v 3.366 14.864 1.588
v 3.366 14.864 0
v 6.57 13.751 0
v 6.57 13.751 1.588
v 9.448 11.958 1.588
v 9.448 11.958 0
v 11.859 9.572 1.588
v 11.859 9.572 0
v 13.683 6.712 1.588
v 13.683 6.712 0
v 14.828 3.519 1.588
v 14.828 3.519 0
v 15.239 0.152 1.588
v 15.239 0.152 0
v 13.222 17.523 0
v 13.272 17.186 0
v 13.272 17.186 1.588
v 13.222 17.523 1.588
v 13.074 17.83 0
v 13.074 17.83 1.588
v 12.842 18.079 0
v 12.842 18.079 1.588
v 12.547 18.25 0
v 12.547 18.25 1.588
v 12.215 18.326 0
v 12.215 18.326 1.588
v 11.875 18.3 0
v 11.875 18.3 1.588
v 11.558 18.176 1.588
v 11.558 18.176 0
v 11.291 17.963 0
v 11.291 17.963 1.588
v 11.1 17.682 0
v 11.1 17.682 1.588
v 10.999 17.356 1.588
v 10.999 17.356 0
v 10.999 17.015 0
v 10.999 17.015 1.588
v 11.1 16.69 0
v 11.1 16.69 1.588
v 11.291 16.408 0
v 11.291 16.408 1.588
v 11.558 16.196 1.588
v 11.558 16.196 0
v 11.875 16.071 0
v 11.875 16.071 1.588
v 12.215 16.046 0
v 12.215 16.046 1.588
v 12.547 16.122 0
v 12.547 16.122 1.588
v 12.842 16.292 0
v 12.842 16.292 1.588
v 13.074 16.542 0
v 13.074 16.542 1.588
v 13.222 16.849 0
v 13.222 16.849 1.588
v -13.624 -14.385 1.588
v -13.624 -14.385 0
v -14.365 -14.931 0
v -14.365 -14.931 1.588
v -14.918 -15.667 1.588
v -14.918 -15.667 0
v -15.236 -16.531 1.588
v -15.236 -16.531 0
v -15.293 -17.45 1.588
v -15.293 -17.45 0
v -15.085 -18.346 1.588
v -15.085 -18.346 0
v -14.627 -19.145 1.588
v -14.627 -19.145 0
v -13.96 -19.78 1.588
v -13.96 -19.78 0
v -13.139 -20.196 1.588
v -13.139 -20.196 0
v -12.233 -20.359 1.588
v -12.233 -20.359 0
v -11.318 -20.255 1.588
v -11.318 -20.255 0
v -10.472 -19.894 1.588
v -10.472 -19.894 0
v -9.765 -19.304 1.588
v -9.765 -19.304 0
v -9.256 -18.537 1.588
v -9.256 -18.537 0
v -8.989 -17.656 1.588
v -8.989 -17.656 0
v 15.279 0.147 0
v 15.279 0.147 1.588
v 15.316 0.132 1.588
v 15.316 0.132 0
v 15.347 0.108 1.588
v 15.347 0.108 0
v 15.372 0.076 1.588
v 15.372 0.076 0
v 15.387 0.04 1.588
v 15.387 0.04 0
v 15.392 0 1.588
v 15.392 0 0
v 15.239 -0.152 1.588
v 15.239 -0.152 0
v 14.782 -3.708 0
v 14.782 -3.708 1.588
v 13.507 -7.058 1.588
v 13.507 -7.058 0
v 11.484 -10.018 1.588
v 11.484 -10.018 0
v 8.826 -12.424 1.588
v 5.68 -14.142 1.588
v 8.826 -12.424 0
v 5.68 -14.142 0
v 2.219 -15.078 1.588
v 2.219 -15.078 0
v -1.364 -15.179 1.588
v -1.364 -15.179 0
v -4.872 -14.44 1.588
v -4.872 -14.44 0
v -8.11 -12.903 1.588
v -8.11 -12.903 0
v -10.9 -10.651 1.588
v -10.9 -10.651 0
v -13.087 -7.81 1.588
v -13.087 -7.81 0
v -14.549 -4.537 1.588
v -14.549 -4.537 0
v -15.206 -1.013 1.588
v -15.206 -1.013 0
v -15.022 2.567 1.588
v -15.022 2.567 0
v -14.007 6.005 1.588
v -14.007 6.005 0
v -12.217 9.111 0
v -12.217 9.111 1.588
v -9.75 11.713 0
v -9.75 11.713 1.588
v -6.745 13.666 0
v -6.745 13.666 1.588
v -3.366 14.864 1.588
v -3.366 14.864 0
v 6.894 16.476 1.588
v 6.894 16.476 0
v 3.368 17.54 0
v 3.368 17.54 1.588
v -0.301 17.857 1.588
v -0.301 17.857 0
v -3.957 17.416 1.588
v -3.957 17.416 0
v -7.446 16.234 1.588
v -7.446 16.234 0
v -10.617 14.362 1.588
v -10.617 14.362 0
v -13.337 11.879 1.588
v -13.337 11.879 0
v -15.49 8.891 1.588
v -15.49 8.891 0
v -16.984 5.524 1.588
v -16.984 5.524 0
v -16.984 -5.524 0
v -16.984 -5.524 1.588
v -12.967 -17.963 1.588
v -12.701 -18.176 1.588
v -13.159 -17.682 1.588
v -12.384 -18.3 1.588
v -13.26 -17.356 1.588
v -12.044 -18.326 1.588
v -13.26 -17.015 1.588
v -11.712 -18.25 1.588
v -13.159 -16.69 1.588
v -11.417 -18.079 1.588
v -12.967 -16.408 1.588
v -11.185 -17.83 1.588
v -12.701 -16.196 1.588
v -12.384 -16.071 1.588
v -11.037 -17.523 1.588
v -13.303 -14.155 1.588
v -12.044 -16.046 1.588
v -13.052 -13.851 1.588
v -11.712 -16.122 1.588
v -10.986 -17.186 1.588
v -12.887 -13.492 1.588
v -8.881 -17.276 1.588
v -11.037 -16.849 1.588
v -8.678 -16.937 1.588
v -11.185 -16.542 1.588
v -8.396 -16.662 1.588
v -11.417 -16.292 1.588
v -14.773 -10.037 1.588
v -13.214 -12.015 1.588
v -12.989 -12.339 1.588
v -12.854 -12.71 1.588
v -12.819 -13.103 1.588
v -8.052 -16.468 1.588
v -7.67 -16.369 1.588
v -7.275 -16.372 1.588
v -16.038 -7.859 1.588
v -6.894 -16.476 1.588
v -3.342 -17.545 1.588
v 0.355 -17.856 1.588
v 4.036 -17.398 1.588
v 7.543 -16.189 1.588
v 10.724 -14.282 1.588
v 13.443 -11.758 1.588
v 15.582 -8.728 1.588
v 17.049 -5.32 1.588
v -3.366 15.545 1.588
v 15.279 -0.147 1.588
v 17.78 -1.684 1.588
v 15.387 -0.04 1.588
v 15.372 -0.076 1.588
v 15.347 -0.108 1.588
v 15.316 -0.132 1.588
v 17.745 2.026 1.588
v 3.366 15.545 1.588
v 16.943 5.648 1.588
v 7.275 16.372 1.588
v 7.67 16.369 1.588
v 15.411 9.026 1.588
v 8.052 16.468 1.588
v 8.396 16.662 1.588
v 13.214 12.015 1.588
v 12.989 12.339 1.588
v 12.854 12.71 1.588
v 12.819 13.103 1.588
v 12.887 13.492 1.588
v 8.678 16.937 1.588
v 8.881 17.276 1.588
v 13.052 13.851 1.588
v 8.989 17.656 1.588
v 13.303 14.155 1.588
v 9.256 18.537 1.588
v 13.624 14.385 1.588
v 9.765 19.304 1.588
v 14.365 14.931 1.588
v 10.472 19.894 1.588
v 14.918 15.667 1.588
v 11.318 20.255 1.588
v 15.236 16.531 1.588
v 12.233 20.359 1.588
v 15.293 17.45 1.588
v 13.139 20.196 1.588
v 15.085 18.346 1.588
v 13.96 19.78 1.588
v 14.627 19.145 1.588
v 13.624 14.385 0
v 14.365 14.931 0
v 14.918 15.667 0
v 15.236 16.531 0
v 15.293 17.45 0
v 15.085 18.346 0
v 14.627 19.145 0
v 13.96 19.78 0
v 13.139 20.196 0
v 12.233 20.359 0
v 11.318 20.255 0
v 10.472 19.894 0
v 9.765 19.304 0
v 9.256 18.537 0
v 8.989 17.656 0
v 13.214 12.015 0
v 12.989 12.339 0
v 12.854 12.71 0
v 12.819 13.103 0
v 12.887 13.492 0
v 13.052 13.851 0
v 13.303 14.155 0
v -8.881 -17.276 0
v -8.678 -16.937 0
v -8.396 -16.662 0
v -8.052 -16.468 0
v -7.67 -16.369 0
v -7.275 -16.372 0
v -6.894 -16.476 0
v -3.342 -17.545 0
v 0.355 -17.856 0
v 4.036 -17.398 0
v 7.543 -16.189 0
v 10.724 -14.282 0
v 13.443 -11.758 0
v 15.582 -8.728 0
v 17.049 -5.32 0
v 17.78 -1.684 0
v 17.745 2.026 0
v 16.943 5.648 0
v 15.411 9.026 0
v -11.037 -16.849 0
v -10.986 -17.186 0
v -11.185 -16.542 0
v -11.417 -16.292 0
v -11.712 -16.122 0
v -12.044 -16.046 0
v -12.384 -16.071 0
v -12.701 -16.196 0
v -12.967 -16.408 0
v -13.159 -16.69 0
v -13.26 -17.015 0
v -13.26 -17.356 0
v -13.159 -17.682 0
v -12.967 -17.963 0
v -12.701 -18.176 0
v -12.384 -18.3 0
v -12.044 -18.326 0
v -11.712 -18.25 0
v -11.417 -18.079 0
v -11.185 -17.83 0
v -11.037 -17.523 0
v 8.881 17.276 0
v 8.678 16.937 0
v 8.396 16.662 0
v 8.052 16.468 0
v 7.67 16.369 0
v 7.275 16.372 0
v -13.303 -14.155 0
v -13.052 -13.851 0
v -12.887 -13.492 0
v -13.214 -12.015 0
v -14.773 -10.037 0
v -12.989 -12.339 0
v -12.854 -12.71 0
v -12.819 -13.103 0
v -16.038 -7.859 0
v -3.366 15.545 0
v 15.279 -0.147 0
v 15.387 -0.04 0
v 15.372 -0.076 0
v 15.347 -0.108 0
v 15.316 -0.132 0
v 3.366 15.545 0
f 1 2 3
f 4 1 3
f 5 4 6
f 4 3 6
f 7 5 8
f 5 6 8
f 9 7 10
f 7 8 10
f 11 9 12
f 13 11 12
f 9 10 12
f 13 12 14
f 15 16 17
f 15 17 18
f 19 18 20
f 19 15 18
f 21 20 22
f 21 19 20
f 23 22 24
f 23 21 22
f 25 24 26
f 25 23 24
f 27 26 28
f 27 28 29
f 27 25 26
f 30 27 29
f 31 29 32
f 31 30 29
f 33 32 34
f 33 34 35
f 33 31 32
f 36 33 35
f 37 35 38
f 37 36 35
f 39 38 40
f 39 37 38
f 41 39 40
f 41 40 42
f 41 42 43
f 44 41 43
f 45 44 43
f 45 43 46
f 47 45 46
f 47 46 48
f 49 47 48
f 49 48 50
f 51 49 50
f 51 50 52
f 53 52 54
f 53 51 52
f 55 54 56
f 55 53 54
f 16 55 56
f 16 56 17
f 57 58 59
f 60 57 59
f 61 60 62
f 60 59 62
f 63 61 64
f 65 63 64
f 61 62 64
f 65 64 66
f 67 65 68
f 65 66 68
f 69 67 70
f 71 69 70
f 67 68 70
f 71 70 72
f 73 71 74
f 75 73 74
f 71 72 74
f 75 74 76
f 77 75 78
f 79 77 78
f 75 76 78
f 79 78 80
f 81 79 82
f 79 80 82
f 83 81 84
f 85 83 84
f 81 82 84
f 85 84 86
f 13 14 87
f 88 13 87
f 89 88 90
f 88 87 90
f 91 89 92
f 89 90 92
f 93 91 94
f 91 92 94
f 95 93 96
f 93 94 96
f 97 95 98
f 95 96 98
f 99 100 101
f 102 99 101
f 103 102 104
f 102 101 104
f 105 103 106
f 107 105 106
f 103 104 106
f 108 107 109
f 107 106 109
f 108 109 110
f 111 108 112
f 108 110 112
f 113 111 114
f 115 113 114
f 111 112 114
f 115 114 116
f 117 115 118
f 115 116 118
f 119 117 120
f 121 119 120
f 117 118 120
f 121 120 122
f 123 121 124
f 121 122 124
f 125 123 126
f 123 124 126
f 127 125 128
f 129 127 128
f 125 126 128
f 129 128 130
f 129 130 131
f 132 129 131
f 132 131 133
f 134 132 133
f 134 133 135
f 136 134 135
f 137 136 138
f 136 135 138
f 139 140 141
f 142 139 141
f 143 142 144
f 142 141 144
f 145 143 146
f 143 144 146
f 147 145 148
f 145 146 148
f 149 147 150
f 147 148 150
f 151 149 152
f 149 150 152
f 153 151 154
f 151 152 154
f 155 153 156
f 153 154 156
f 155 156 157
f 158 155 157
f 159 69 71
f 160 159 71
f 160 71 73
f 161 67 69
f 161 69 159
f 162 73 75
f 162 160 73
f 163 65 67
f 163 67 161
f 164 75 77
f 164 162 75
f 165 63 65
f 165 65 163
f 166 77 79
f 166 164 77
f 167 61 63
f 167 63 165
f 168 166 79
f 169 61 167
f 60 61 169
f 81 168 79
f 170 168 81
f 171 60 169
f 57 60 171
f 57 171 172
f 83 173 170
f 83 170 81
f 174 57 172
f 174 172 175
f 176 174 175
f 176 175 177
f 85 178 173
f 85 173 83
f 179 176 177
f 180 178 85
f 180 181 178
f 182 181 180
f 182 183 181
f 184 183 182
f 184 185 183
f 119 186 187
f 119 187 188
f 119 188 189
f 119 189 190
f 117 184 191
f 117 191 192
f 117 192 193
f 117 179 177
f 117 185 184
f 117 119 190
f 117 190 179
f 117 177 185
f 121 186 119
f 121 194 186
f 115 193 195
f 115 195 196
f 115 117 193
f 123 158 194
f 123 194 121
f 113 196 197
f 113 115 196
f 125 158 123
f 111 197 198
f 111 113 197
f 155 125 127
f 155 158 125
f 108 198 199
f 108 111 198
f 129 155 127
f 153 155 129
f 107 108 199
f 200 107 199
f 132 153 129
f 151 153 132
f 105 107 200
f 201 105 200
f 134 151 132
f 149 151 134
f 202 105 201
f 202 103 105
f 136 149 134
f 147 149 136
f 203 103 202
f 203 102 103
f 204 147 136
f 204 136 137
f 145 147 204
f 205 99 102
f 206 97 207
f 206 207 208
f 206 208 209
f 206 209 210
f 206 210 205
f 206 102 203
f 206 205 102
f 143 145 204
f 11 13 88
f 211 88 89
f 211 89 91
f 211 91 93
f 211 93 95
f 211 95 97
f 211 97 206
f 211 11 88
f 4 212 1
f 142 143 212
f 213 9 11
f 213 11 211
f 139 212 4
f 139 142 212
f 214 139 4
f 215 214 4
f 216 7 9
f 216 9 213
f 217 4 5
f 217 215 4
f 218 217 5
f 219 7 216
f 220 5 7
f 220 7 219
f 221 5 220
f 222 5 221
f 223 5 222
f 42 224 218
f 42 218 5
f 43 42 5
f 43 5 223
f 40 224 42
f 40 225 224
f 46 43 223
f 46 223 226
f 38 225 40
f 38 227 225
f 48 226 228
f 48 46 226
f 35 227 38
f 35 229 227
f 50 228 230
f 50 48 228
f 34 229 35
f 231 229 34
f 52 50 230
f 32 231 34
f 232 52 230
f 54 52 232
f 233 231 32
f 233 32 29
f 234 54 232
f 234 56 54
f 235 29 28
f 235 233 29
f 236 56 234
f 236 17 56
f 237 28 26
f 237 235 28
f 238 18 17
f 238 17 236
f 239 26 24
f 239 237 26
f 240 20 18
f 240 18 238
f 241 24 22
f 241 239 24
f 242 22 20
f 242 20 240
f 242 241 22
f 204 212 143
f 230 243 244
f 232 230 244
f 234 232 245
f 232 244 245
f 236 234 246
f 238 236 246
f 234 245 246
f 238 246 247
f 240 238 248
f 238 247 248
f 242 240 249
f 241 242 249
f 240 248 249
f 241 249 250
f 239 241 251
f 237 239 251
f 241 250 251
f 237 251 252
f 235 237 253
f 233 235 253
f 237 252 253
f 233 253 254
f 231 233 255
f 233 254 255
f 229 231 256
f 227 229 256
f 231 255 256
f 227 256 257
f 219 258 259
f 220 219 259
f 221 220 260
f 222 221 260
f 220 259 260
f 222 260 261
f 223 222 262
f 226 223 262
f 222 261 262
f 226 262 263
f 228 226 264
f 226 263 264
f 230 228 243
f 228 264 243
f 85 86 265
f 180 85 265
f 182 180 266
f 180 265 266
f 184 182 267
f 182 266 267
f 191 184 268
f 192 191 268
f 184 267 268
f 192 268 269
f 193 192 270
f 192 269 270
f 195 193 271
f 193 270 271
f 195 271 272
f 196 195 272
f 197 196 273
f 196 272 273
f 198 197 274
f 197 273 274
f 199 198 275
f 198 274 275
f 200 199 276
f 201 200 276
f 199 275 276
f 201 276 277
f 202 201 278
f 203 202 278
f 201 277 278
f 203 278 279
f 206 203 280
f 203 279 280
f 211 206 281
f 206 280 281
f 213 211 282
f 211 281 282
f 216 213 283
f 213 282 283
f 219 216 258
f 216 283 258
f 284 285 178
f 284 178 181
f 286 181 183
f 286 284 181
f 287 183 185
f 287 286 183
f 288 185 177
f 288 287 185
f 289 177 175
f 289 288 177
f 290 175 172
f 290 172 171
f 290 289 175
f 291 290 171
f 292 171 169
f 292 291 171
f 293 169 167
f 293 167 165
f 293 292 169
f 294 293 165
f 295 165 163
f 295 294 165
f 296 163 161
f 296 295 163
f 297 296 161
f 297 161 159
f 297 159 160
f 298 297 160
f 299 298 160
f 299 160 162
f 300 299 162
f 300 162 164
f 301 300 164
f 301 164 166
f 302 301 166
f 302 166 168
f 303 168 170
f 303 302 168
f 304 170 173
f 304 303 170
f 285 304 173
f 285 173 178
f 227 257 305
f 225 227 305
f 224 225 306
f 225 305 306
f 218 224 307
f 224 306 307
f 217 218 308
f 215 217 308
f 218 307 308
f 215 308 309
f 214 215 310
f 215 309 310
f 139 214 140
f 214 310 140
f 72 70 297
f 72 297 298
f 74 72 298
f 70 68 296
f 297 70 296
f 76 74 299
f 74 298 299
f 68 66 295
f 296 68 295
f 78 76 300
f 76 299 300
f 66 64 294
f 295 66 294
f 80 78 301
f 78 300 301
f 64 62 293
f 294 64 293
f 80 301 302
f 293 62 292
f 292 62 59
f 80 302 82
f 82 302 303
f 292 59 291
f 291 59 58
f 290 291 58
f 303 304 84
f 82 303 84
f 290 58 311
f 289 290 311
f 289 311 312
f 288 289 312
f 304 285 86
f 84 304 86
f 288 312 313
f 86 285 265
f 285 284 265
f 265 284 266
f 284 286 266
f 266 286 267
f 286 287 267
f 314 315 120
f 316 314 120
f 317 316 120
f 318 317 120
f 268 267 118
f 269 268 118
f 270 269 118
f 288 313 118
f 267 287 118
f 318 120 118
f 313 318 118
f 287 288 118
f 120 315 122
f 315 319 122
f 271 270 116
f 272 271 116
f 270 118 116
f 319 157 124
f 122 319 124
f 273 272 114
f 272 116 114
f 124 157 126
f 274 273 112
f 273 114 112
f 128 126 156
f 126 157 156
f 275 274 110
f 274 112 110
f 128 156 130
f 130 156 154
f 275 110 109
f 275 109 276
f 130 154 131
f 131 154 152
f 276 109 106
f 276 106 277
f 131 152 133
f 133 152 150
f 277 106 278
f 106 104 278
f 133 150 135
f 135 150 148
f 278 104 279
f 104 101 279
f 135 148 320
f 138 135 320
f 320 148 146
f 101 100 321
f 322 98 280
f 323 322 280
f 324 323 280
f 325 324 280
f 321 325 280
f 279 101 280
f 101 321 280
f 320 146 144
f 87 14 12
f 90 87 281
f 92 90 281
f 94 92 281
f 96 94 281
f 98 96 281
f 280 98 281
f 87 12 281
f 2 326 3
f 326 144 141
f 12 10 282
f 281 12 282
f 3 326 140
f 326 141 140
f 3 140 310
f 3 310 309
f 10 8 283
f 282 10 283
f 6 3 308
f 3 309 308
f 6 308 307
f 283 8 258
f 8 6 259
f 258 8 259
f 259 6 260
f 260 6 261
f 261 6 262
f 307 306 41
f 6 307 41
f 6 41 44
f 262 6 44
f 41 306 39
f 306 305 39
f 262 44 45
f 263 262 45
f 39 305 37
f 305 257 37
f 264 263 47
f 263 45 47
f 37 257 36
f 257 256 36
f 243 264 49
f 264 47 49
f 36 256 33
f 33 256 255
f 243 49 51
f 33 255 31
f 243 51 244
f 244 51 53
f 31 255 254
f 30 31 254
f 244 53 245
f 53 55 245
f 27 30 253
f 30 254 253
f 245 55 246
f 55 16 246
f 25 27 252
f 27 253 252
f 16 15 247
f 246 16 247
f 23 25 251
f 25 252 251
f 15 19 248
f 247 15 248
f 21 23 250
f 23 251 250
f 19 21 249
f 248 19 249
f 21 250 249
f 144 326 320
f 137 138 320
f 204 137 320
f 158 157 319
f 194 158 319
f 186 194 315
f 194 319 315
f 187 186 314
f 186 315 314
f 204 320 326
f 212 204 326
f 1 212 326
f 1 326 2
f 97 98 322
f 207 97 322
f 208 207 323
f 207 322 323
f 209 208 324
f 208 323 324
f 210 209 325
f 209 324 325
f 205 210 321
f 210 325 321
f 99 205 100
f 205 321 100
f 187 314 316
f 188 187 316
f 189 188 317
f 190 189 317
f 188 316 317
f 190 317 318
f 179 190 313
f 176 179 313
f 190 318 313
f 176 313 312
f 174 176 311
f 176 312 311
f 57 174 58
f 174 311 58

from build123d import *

# Parameters (mm, degrees)
SKETCH1_R           = 1.143
BOSS_EXTRUDE1_DEPTH = 1.5875


with BuildPart() as part:
    # Sketch1 → Boss-Extrude1 (new body)
    with BuildSketch(Plane.XY):
        with BuildLine():
            ThreePointArc((6.893924032, 16.475805386), (-7.445500456, 16.234003654), (-16.984058744, 5.5245))
            Line((-16.984058744, 5.5245), (-16.984058744, -5.5245))
            ThreePointArc((-16.984058744, -5.5245), (-15.444009606, -8.970001058), (-13.214344503, -12.014967792))
            ThreePointArc((-13.214344503, -12.014967792), (-12.840241174, -13.300024042), (-13.624339722, -14.384695574))
            ThreePointArc((-13.624339722, -14.384695574), (-13.960152262, -19.779700621), (-8.989376751, -17.655967979))
            ThreePointArc((-8.989376751, -17.655967979), (-8.230051983, -16.553811563), (-6.893924032, -16.475805386))
            ThreePointArc((-6.893924032, -16.475805386), (14.591708872, -10.298562224), (13.214344503, 12.014967792))
            ThreePointArc((13.214344503, 12.014967792), (12.840241174, 13.300024042), (13.624339722, 14.384695574))
            ThreePointArc((13.624339722, 14.384695574), (13.960152262, 19.779700621), (8.989376751, 17.655967979))
            ThreePointArc((8.989376751, 17.655967979), (8.230051983, 16.553811563), (6.893924032, 16.475805386))
        make_face()
        with BuildLine():
            Line((-3.3655, 14.863748173), (-3.3655, 15.5448))
            Line((-3.3655, 15.5448), (3.3655, 15.5448))
            Line((3.3655, 15.5448), (3.3655, 14.863748173))
            ThreePointArc((3.3655, 14.863748173), (11.859174688, 9.571707043), (15.239238, 0.152398095))
            ThreePointArc((15.239238, 0.152398095), (15.3924, 0), (15.239238, -0.152398095))
            ThreePointArc((15.239238, -0.152398095), (-9.571707043, -11.859174688), (-3.3655, 14.863748173))
        make_face(mode=Mode.SUBTRACT)
        with Locations((12.129357243, 17.185704746)):
            Circle(SKETCH1_R, mode=Mode.SUBTRACT)
        with Locations((-12.129357243, -17.185704746)):
            Circle(SKETCH1_R, mode=Mode.SUBTRACT)
    extrude(amount=BOSS_EXTRUDE1_DEPTH)


solid = part.part
